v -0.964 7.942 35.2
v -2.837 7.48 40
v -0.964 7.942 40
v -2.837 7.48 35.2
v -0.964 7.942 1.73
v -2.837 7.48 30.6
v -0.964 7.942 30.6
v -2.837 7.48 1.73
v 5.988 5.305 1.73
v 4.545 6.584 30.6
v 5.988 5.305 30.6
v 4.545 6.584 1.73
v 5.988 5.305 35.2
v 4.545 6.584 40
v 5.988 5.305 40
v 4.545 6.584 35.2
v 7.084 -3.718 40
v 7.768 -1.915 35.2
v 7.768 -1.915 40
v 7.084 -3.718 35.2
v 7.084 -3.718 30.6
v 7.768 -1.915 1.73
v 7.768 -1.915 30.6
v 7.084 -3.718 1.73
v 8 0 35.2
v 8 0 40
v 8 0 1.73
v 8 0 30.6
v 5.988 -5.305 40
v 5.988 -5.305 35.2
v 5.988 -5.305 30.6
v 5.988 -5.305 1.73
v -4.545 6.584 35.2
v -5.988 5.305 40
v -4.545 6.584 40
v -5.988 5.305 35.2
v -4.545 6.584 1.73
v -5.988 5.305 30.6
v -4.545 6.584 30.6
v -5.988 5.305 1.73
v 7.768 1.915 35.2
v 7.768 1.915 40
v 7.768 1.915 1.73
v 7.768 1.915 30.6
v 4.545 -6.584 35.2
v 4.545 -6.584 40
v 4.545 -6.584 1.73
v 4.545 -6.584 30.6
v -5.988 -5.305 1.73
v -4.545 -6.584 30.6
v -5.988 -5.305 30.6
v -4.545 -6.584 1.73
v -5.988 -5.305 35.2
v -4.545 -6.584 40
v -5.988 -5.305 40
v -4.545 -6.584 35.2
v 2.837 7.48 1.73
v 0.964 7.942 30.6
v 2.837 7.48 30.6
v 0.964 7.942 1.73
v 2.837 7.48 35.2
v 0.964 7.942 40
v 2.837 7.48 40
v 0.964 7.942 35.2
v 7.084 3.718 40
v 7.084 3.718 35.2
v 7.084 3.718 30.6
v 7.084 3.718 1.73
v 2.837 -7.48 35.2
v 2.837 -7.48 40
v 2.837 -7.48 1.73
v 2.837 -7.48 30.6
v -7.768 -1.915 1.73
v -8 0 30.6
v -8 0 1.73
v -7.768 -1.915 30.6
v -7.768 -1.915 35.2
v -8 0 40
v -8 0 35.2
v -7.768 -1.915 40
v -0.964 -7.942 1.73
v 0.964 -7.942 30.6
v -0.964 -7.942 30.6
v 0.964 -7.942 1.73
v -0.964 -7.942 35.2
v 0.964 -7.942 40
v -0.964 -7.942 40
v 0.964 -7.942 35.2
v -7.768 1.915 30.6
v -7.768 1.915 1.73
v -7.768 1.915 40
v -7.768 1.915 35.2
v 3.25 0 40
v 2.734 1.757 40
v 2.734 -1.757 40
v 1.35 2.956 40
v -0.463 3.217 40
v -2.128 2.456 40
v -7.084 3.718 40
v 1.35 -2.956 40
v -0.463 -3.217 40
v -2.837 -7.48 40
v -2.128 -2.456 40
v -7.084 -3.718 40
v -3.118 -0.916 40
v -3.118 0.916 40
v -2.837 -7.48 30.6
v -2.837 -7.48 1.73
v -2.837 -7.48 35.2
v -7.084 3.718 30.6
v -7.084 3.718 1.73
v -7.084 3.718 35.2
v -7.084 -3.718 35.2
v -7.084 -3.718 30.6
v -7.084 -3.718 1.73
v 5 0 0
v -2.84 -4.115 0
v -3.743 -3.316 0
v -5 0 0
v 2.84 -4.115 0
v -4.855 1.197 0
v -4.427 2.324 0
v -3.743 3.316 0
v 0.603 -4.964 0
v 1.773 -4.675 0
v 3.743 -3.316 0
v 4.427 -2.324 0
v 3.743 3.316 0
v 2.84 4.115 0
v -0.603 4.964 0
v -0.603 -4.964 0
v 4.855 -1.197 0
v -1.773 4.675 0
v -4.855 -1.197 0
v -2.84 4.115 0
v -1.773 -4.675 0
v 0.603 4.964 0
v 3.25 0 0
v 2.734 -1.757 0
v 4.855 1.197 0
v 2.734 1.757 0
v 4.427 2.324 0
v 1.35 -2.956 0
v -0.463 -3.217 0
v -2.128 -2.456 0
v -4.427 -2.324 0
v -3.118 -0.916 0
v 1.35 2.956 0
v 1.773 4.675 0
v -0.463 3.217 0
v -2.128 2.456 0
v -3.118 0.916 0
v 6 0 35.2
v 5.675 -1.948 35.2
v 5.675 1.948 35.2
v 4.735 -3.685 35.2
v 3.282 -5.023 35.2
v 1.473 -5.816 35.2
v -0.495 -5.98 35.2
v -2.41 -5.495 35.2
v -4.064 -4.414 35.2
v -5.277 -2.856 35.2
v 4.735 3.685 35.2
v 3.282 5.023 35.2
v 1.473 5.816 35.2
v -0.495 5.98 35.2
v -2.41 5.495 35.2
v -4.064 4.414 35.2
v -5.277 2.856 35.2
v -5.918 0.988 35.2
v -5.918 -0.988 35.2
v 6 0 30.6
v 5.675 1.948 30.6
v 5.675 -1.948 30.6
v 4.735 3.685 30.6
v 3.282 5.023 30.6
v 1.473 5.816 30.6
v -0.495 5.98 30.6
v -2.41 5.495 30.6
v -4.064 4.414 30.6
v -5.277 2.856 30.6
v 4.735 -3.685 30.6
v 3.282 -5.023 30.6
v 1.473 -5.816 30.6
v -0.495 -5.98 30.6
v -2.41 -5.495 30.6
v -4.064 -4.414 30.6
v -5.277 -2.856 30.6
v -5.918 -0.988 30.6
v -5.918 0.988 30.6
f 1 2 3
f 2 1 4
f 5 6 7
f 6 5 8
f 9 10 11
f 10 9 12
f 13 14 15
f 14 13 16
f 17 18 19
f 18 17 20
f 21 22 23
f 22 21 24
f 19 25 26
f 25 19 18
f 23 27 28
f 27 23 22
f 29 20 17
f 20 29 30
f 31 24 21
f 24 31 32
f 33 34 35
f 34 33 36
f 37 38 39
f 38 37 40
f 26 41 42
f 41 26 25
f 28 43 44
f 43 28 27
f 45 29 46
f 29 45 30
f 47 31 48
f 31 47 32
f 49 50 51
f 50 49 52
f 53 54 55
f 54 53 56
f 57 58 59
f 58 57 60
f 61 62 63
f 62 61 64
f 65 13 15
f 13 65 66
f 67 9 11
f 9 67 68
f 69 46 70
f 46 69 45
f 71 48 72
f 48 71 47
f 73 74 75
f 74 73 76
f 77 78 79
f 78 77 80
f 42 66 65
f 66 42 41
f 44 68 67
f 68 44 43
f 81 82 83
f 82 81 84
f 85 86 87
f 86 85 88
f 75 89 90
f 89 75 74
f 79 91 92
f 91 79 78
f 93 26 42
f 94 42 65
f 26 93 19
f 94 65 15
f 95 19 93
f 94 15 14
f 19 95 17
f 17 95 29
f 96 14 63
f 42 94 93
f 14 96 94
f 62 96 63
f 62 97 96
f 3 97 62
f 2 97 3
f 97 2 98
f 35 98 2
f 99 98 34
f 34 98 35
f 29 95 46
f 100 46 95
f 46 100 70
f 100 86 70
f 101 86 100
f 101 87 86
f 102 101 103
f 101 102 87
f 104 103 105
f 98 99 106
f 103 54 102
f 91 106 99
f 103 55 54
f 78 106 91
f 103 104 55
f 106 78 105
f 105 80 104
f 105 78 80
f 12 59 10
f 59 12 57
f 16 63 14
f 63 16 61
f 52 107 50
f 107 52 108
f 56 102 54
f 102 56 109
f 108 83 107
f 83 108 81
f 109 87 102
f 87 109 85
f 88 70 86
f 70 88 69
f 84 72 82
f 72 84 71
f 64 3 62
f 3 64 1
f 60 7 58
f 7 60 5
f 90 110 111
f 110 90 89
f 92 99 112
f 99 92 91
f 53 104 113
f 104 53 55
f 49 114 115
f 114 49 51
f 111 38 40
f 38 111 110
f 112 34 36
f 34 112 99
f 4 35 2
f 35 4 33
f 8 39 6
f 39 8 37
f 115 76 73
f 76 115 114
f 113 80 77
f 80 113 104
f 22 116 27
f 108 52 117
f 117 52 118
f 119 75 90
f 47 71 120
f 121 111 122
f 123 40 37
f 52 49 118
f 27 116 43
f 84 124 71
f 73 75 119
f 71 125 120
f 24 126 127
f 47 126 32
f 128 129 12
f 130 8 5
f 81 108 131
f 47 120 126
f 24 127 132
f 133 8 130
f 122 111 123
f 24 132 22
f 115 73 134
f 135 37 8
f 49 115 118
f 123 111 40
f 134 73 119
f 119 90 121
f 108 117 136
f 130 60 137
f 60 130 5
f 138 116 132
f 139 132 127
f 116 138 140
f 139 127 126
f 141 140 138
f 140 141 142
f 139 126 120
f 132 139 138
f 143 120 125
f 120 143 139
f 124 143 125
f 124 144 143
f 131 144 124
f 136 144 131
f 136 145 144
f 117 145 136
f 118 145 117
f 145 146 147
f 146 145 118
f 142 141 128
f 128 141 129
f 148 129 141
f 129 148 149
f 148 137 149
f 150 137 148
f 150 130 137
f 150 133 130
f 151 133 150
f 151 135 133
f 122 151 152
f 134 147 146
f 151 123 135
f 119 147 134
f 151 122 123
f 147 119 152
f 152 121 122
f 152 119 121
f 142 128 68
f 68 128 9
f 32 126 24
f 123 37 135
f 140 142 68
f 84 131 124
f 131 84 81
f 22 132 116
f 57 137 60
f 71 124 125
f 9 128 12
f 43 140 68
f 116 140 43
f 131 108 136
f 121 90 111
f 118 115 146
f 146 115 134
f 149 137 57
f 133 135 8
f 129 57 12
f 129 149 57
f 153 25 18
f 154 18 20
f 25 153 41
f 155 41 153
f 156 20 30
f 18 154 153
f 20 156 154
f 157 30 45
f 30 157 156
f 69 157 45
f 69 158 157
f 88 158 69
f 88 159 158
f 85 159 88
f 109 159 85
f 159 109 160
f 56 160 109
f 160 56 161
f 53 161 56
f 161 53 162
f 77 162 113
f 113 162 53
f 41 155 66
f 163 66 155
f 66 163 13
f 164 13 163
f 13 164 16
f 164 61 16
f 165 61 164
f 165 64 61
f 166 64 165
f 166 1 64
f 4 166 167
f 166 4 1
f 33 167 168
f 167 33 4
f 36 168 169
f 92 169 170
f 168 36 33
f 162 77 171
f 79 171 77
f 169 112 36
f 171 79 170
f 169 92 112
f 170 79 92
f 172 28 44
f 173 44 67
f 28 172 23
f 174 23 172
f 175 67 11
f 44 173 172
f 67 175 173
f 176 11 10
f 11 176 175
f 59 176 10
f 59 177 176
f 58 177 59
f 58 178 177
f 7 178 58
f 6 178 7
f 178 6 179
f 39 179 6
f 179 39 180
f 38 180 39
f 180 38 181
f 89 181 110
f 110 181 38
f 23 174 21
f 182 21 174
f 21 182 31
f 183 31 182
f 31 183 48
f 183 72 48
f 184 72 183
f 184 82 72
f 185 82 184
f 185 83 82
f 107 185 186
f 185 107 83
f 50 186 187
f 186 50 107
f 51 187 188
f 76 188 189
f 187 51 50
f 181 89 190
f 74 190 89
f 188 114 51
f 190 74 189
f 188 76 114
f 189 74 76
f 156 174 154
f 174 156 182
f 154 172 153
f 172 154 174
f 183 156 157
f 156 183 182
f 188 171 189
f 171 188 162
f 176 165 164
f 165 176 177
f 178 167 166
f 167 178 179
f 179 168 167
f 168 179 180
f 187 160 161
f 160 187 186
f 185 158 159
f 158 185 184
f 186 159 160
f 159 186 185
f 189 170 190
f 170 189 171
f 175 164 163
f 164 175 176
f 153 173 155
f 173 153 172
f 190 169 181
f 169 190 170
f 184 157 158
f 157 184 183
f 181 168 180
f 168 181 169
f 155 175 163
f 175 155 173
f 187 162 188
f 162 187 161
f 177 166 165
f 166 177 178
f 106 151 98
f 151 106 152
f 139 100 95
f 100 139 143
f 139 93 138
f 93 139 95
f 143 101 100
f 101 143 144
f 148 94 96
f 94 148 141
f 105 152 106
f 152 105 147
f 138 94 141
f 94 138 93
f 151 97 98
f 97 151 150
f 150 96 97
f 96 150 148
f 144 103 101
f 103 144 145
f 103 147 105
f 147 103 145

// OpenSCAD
/* derived from http://reprap.org/mediawiki/images/8/8c/Jhn_nozzle_holder_v5_metric.jpg
 * not an accurate representation - for visual purposes only
 * 
 * NOTE: collar *is* accurately modelled
 */

outer_dia = 16;
groove_mount_dia = 12;
groove_mount_height = 4.6;
groove_mount_offset = 4.8;
length = 40;
nozzle_holder_end_dia = 10;
nozzle_holder_end_height = 1.73;

module jhead_nozzle_holder()
{
	translate([0,0,length])
	{
		rotate([180,0,0])
		{
			difference()
			{
				union()
				{
					cylinder(r=outer_dia/2, h=length-nozzle_holder_end_height);
					translate([0,0,length-nozzle_holder_end_height])
					{
						cylinder(r1=outer_dia/2, r2=nozzle_holder_end_dia/2, h=nozzle_holder_end_height);
					}
				}
				translate([0,0,groove_mount_offset])
				{
					difference()
					{
						cylinder(r=groove_mount_dia,h=groove_mount_height);
						translate([0,0,-0.5])
						{
							cylinder(r=groove_mount_dia/2,h=groove_mount_height+1);
						}
					}
				}
				translate([0,0,-1])
				{
					cylinder(r=6.5/2, h=50);
				}
			}
		}
	}
}

jhead_nozzle_holder();
